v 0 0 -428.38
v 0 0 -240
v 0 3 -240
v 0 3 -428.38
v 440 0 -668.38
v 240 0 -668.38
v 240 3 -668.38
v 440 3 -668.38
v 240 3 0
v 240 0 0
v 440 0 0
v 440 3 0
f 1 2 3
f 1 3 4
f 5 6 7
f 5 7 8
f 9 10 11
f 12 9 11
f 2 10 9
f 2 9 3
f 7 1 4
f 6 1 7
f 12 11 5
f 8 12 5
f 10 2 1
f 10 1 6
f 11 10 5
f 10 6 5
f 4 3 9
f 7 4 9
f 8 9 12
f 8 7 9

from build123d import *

# Parameters (mm, degrees)
SKETCH1_W           = 440
SKETCH1_H           = 668.38
BOSS_EXTRUDE1_DEPTH = 3
CUT_EXTRUDE1_DEPTH  = 4


with BuildPart() as part:
    # Sketch1 → Boss-Extrude1 (new body)
    with BuildSketch(Plane(origin=(0, 0, 0), x_dir=(1, 0, 0), z_dir=(0, 1, 0))):
        with Locations((220, 334.19)):
            Rectangle(SKETCH1_W, SKETCH1_H)
    extrude(amount=BOSS_EXTRUDE1_DEPTH)

    # Sketch2 → Cut-Extrude1 (cut, through all)
    with BuildSketch(Plane.XZ):
        Polygon((240, 0), (0, -240), (0, 0), align=None)
        Polygon((0, -428.38), (240, -668.38), (0, -668.38), align=None)
    extrude(amount=-CUT_EXTRUDE1_DEPTH, mode=Mode.SUBTRACT)


solid = part.part
